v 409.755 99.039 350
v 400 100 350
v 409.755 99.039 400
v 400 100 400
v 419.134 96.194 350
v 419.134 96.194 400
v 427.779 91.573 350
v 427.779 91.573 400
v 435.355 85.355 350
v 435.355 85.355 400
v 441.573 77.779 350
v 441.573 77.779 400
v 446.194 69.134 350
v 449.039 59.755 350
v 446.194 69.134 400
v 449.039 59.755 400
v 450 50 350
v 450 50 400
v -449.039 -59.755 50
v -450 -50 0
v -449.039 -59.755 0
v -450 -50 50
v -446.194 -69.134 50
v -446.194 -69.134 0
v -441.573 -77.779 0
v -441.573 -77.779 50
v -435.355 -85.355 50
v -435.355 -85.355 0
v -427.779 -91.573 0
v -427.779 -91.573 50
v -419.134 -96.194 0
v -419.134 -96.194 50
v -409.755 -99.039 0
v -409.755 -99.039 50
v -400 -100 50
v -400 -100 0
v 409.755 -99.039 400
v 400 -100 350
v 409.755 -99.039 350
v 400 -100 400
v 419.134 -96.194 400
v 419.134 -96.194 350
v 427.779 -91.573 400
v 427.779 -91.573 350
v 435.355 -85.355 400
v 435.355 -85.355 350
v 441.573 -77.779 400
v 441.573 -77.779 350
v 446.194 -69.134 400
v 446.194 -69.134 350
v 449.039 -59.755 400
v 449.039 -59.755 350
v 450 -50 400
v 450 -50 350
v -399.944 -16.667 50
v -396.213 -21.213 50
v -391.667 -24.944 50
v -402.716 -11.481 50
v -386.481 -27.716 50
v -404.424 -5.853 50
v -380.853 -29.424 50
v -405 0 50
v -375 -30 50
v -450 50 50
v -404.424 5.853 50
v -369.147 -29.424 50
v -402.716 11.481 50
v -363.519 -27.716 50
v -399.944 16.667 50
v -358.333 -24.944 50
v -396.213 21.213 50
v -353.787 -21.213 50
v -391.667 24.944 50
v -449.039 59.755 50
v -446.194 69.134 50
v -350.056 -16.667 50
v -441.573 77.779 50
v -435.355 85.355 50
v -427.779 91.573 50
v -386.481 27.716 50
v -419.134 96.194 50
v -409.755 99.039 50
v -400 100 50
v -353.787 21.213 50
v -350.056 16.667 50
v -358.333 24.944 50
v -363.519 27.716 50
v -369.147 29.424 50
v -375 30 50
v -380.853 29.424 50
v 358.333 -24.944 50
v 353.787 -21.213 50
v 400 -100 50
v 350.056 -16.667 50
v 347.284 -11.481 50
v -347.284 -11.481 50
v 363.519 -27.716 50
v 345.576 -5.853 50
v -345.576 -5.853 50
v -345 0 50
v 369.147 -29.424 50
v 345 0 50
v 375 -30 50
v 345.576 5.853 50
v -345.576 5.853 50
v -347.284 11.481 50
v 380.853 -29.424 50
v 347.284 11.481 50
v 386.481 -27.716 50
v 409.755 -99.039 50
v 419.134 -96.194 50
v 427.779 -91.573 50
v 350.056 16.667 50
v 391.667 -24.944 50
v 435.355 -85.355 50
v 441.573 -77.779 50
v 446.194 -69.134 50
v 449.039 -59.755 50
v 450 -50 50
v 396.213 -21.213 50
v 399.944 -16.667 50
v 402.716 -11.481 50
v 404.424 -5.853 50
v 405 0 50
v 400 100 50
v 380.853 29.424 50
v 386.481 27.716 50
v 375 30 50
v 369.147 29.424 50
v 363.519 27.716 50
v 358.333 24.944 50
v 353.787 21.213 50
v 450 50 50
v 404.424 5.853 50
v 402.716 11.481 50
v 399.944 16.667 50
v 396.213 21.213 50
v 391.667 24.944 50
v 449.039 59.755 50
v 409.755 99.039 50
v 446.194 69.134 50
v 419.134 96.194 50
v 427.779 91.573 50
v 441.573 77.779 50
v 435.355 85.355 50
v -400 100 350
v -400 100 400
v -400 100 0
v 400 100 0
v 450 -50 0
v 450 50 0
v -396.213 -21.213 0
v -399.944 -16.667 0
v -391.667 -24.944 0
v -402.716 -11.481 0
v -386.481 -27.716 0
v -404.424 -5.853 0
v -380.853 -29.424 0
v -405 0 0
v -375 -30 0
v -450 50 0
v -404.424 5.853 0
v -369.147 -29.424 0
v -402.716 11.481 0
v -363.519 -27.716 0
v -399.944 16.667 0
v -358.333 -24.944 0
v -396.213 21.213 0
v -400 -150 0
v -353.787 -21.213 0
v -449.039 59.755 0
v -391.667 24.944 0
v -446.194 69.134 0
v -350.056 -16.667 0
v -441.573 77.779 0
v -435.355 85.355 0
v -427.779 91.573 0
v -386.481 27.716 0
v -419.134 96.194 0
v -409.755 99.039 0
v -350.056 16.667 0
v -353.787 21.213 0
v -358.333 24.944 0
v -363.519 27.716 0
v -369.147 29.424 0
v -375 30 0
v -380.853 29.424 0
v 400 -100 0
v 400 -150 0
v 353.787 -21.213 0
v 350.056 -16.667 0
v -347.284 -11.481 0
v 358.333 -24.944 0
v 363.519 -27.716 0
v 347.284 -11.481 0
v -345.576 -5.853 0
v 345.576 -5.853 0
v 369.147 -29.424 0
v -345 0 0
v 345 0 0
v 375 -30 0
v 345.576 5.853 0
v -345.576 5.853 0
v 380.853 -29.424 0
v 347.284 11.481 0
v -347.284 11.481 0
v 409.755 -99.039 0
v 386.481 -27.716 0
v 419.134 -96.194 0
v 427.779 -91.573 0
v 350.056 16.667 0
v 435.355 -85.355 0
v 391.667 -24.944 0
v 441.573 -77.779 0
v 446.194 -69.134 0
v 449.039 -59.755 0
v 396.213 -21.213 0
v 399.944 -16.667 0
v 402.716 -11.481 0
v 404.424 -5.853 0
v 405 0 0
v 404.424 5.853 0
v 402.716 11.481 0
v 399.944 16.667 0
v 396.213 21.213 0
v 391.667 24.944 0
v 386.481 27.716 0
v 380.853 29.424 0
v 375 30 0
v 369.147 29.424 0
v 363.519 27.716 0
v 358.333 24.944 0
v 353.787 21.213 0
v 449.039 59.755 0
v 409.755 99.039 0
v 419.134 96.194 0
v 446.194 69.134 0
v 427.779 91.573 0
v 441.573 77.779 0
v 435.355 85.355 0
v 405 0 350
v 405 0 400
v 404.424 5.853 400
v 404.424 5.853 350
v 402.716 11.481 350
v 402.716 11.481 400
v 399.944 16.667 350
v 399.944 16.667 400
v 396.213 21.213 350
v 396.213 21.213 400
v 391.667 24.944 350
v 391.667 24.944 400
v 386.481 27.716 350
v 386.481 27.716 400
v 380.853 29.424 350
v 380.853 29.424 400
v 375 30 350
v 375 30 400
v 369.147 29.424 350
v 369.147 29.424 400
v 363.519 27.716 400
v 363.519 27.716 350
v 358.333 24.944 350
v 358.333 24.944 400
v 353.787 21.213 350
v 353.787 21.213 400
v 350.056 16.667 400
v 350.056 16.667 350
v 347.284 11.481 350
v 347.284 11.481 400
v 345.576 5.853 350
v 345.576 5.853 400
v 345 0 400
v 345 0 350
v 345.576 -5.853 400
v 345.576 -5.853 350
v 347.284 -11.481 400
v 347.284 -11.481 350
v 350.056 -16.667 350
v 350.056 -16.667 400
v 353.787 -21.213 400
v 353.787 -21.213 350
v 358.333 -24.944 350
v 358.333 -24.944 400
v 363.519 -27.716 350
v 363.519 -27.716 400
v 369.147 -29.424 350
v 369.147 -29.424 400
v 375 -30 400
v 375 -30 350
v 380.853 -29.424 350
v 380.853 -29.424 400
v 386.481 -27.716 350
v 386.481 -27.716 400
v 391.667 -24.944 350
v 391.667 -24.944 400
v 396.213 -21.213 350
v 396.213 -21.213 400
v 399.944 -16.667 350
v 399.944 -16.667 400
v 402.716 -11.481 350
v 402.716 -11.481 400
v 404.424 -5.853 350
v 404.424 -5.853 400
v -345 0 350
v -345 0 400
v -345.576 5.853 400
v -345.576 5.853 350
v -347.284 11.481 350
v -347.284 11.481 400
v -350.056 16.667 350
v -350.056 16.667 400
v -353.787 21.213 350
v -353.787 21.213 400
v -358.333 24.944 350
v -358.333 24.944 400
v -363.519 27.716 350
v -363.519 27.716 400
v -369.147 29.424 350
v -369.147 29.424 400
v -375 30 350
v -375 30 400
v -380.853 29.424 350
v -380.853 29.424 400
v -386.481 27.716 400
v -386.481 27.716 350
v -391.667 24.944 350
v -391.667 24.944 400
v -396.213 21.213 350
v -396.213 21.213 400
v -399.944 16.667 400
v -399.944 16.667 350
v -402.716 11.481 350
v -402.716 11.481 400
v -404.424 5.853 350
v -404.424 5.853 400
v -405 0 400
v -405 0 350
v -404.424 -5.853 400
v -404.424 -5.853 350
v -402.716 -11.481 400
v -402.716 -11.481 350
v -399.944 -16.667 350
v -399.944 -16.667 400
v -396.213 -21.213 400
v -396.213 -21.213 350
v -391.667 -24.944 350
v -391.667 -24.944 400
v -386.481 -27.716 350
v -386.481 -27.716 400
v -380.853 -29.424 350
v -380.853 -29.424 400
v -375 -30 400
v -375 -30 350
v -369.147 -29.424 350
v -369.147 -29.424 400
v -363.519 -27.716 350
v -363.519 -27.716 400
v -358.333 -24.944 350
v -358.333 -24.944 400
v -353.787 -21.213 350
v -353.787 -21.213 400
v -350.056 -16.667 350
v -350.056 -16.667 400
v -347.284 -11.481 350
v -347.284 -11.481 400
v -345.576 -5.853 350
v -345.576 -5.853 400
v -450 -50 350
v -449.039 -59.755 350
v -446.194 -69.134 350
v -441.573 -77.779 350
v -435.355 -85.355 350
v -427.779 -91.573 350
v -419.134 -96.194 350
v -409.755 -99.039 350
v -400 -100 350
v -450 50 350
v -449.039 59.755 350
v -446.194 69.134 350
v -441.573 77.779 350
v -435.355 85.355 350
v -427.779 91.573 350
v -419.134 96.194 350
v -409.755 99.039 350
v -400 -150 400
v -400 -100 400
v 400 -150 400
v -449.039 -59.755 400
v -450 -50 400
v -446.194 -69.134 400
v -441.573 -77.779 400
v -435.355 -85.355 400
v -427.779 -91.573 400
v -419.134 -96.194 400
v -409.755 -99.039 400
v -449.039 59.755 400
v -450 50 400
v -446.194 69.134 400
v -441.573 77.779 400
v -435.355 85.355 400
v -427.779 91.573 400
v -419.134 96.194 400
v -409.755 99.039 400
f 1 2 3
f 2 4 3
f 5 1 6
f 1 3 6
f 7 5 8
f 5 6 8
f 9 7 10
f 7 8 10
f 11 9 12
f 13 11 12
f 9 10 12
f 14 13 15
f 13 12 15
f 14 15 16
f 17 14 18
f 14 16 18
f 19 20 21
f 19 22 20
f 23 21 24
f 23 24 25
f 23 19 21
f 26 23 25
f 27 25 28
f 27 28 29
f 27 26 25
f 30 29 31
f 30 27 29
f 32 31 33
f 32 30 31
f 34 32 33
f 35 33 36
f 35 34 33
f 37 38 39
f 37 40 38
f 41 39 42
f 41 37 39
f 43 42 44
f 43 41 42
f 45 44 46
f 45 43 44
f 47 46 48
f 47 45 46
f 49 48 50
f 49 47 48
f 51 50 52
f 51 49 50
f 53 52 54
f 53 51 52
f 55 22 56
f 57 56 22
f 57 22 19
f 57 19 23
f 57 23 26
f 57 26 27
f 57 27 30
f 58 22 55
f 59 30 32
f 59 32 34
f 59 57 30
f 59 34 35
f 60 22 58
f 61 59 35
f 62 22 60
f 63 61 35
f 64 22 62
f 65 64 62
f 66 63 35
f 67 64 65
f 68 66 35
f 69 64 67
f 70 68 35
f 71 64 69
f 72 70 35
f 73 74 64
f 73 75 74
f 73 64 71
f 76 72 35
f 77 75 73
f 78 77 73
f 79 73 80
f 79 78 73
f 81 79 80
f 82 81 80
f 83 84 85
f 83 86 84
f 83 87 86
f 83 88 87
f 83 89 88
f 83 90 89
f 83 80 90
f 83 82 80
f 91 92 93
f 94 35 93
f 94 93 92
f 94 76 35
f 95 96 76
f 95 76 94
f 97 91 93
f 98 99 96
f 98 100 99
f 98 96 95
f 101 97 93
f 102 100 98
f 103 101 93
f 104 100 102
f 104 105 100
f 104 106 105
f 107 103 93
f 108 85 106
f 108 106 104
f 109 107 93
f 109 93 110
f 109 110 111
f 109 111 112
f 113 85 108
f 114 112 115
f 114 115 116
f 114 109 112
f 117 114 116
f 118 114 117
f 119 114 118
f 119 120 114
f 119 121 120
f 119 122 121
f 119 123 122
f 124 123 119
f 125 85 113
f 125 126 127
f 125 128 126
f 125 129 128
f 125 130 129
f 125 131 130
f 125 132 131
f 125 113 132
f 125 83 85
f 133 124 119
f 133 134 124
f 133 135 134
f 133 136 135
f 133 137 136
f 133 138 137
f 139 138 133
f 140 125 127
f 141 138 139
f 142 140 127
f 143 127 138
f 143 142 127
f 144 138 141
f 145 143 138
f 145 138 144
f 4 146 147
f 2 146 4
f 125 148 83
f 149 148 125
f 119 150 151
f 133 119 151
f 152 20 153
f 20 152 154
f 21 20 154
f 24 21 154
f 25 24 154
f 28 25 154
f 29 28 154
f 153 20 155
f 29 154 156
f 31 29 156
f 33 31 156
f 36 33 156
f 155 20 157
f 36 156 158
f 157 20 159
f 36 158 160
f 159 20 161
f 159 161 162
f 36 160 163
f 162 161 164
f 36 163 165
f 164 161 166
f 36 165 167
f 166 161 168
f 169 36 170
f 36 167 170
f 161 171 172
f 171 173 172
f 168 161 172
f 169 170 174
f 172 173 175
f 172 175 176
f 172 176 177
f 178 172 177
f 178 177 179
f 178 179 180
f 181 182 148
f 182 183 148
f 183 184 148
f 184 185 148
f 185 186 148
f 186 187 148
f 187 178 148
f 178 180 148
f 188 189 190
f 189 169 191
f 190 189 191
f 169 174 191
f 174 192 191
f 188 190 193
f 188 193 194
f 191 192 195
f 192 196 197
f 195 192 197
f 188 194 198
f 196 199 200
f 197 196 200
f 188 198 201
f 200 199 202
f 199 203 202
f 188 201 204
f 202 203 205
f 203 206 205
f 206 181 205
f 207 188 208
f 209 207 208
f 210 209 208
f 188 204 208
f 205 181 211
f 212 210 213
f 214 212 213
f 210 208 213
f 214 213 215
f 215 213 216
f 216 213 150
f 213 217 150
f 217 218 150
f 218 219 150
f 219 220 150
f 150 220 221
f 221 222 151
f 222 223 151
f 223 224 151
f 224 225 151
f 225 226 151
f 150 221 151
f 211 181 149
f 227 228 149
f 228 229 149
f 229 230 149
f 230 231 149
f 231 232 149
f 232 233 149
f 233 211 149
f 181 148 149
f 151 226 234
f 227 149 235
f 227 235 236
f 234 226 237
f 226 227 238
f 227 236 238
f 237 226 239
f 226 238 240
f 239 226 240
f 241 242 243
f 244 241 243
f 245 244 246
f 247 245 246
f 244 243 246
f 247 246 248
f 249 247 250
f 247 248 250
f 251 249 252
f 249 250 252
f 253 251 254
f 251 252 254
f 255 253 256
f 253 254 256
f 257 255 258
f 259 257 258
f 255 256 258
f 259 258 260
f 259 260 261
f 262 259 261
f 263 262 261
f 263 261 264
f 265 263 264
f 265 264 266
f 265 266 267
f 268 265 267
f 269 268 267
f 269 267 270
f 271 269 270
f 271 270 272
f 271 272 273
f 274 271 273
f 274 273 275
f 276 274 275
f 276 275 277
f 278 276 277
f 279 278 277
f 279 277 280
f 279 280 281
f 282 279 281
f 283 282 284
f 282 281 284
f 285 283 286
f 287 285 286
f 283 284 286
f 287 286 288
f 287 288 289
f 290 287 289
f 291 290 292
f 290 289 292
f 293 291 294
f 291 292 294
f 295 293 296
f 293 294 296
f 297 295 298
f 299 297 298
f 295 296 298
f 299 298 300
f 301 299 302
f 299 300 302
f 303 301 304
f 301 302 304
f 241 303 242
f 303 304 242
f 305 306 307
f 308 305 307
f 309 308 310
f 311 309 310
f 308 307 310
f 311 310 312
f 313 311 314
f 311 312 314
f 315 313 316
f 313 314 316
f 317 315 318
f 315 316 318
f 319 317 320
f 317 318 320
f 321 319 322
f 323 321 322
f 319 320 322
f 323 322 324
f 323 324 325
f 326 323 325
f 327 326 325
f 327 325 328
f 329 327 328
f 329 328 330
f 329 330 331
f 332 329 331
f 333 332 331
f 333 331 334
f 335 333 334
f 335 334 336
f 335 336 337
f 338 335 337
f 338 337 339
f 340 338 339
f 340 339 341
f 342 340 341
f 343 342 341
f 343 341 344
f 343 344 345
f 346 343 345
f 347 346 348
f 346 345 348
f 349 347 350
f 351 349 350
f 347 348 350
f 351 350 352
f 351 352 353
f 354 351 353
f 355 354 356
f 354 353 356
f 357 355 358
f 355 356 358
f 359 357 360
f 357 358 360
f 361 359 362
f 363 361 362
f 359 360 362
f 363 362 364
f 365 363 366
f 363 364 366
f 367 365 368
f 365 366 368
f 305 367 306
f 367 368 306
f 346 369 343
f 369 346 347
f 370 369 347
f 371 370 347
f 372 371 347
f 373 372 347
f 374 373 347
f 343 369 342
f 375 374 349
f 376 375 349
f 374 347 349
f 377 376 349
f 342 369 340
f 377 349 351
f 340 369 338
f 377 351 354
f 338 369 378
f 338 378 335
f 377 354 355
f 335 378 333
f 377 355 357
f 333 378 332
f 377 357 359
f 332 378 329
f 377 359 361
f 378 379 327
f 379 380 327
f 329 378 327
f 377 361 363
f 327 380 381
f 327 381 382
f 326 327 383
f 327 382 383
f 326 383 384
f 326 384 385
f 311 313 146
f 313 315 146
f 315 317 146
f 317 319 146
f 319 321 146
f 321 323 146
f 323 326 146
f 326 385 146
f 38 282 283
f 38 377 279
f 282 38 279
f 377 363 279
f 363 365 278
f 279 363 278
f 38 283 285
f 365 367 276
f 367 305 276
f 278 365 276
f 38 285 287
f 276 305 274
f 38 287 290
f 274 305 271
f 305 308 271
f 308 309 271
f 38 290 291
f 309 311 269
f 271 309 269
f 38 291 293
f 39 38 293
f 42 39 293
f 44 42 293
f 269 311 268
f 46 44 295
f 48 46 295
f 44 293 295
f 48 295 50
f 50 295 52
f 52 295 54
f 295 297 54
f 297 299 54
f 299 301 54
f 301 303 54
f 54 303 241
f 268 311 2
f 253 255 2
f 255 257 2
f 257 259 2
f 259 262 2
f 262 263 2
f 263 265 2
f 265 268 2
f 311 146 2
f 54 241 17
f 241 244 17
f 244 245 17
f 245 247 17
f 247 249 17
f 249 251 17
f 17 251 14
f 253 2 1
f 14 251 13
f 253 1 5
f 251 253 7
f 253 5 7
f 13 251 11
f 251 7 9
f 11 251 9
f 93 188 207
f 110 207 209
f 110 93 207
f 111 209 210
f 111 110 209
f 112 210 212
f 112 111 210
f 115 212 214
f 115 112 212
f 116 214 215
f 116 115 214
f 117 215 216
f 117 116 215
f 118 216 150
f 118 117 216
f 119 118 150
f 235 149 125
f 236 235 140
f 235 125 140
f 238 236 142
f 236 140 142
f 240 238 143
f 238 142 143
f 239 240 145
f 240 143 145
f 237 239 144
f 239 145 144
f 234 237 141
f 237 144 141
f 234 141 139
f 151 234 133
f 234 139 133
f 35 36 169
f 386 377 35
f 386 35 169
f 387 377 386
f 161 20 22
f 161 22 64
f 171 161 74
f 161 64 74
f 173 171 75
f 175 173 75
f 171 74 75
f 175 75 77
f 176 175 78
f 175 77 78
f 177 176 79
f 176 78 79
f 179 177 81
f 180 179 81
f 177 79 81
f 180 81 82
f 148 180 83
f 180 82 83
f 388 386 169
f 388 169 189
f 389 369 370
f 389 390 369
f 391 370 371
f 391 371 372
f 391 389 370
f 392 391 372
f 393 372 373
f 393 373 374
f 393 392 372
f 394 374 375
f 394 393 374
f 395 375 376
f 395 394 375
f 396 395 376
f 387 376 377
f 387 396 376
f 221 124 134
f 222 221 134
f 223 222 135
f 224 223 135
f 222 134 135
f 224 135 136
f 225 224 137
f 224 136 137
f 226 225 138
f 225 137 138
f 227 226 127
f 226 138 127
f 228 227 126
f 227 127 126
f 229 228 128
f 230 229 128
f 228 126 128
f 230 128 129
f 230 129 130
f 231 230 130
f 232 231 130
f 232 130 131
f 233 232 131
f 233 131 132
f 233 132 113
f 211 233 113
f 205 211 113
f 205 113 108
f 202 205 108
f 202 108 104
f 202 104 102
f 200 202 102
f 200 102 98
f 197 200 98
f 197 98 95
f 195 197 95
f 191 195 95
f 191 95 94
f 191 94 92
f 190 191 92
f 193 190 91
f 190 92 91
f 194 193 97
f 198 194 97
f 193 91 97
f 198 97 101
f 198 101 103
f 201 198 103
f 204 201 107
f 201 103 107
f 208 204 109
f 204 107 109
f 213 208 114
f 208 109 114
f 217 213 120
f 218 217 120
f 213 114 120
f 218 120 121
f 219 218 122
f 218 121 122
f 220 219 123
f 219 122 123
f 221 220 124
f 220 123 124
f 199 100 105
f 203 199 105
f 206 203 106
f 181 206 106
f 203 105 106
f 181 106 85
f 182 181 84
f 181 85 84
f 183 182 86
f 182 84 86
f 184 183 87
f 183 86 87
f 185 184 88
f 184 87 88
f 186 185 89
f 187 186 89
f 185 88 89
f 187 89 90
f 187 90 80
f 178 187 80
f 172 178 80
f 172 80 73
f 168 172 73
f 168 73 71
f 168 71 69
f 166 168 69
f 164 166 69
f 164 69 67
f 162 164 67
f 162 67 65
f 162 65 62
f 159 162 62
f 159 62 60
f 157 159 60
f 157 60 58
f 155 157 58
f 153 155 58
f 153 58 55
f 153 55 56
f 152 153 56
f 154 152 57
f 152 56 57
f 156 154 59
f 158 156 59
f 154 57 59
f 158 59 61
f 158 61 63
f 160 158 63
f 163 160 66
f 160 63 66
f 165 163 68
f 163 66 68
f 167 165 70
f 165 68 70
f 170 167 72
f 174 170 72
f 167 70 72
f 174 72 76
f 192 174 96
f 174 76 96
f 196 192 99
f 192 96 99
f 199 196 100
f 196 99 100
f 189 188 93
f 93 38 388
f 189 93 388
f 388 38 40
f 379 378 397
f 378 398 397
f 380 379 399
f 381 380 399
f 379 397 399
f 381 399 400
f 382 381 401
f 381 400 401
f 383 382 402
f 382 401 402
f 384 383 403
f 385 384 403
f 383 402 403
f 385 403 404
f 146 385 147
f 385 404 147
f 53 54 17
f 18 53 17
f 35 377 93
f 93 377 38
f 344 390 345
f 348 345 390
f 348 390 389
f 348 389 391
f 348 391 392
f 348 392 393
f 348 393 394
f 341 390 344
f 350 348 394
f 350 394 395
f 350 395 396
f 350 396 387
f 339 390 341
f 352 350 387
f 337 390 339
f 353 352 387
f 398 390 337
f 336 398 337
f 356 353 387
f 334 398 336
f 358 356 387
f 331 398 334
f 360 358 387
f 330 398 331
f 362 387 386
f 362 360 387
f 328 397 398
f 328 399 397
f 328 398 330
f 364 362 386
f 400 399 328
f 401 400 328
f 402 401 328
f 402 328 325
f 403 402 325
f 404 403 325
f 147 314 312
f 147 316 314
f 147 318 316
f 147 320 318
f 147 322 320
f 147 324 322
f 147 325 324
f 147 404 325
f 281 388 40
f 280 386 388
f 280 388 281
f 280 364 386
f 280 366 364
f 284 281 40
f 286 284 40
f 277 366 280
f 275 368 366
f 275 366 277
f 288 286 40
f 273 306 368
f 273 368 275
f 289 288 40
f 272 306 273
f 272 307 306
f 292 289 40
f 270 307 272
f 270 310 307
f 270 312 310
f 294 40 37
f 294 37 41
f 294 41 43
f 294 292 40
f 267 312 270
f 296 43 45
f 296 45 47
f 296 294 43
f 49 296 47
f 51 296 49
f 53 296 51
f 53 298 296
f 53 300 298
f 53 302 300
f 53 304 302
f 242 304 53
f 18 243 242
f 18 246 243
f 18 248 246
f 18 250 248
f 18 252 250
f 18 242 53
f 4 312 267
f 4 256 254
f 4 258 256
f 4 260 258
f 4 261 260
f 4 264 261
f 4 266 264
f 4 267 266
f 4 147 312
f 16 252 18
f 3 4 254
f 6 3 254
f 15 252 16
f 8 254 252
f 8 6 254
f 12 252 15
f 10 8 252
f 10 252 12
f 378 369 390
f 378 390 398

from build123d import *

# Parameters (mm, degrees)
SKETCH2_W           = 900
SKETCH2_H           = 200
BOSS_EXTRUDE1_DEPTH = 400
SKETCH3_W           = 1697.05478925
SKETCH3_H           = 300
CUT_EXTRUDE1_DEPTH  = 400
FILLET1_R           = 50
FILLET2_R           = 50
SKETCH4_R           = 30
CUT_EXTRUDE3_DEPTH  = 611.327780787
SKETCH4_2_W         = 800
SKETCH4_2_H         = 400
BOSS_EXTRUDE2_DEPTH = 50


with BuildPart() as part:
    # Sketch2 → Boss-Extrude1 (new body)
    with BuildSketch(Plane.XY):
        Rectangle(SKETCH2_W, SKETCH2_H)
    extrude(amount=BOSS_EXTRUDE1_DEPTH)

    # Sketch3 → Cut-Extrude1 (cut)
    with BuildSketch(Plane(origin=(0, 100, 0), x_dir=(1, 0, 0), z_dir=(0, 1, 0))):
        with Locations((0, -200)):
            Rectangle(SKETCH3_W, SKETCH3_H)
    extrude(amount=-CUT_EXTRUDE1_DEPTH, mode=Mode.SUBTRACT)


with BuildPart() as cut_extrude1_piece_1:
    # of the separate pieces the step leaves, piece 1, a body of its own (cut_extrude1_pieces)
    add(part.part.solids().sort_by_distance((-450, -100, 0))[0])

    # Fillet2
    fillet2_edges = [cut_extrude1_piece_1.edges().sort_by_distance(p)[0] for p in [
        (450, -100, 25),
        (-450, -100, 25),
        (-450, 100, 25),
        (450, 100, 25),
    ]]
    fillet(fillet2_edges, radius=FILLET2_R)


with BuildPart() as cut_extrude1_piece_2:
    # of the separate pieces the step leaves, piece 2, a body of its own (cut_extrude1_pieces)
    add(part.part.solids().sort_by_distance((-450, -100, 350))[0])

    # Fillet1
    fillet1_edges = [cut_extrude1_piece_2.edges().sort_by_distance(p)[0] for p in [
        (450, -100, 375),
        (450, 100, 375),
        (-450, 100, 375),
        (-450, -100, 375),
    ]]
    fillet(fillet1_edges, radius=FILLET1_R)


with BuildPart() as cut_extrude3_tool:
    # Sketch4 → Cut-Extrude3 (new, through all)
    with BuildSketch(Plane.XY.offset(400)):
        with Locations((-375, 0)):
            Circle(SKETCH4_R)
        with Locations((375, 0)):
            Circle(SKETCH4_R)
    extrude(amount=-CUT_EXTRUDE3_DEPTH)


with BuildPart() as cut_extrude1_piece_1_1:
    add(cut_extrude1_piece_1.part)

    # Cut-Extrude3: cut by cut_extrude3_tool
    add(cut_extrude3_tool.part, mode=Mode.SUBTRACT)



with BuildPart() as cut_extrude1_piece_2_1:
    add(cut_extrude1_piece_2.part)

    # Cut-Extrude3: cut by cut_extrude3_tool
    add(cut_extrude3_tool.part, mode=Mode.SUBTRACT)


with BuildPart() as cut_extrude1_piece_1_2:
    add(cut_extrude1_piece_1_1.part)

    add(cut_extrude1_piece_2_1.part)  # Boss-Extrude2 merges Cut-Extrude1 piece 2
    # Sketch4 2 → Boss-Extrude2 (add)
    with BuildSketch(Plane.XZ.offset(100)):
        with Locations((0, 200)):
            Rectangle(SKETCH4_2_W, SKETCH4_2_H)
    extrude(amount=BOSS_EXTRUDE2_DEPTH)


solid = cut_extrude1_piece_1_2.part
